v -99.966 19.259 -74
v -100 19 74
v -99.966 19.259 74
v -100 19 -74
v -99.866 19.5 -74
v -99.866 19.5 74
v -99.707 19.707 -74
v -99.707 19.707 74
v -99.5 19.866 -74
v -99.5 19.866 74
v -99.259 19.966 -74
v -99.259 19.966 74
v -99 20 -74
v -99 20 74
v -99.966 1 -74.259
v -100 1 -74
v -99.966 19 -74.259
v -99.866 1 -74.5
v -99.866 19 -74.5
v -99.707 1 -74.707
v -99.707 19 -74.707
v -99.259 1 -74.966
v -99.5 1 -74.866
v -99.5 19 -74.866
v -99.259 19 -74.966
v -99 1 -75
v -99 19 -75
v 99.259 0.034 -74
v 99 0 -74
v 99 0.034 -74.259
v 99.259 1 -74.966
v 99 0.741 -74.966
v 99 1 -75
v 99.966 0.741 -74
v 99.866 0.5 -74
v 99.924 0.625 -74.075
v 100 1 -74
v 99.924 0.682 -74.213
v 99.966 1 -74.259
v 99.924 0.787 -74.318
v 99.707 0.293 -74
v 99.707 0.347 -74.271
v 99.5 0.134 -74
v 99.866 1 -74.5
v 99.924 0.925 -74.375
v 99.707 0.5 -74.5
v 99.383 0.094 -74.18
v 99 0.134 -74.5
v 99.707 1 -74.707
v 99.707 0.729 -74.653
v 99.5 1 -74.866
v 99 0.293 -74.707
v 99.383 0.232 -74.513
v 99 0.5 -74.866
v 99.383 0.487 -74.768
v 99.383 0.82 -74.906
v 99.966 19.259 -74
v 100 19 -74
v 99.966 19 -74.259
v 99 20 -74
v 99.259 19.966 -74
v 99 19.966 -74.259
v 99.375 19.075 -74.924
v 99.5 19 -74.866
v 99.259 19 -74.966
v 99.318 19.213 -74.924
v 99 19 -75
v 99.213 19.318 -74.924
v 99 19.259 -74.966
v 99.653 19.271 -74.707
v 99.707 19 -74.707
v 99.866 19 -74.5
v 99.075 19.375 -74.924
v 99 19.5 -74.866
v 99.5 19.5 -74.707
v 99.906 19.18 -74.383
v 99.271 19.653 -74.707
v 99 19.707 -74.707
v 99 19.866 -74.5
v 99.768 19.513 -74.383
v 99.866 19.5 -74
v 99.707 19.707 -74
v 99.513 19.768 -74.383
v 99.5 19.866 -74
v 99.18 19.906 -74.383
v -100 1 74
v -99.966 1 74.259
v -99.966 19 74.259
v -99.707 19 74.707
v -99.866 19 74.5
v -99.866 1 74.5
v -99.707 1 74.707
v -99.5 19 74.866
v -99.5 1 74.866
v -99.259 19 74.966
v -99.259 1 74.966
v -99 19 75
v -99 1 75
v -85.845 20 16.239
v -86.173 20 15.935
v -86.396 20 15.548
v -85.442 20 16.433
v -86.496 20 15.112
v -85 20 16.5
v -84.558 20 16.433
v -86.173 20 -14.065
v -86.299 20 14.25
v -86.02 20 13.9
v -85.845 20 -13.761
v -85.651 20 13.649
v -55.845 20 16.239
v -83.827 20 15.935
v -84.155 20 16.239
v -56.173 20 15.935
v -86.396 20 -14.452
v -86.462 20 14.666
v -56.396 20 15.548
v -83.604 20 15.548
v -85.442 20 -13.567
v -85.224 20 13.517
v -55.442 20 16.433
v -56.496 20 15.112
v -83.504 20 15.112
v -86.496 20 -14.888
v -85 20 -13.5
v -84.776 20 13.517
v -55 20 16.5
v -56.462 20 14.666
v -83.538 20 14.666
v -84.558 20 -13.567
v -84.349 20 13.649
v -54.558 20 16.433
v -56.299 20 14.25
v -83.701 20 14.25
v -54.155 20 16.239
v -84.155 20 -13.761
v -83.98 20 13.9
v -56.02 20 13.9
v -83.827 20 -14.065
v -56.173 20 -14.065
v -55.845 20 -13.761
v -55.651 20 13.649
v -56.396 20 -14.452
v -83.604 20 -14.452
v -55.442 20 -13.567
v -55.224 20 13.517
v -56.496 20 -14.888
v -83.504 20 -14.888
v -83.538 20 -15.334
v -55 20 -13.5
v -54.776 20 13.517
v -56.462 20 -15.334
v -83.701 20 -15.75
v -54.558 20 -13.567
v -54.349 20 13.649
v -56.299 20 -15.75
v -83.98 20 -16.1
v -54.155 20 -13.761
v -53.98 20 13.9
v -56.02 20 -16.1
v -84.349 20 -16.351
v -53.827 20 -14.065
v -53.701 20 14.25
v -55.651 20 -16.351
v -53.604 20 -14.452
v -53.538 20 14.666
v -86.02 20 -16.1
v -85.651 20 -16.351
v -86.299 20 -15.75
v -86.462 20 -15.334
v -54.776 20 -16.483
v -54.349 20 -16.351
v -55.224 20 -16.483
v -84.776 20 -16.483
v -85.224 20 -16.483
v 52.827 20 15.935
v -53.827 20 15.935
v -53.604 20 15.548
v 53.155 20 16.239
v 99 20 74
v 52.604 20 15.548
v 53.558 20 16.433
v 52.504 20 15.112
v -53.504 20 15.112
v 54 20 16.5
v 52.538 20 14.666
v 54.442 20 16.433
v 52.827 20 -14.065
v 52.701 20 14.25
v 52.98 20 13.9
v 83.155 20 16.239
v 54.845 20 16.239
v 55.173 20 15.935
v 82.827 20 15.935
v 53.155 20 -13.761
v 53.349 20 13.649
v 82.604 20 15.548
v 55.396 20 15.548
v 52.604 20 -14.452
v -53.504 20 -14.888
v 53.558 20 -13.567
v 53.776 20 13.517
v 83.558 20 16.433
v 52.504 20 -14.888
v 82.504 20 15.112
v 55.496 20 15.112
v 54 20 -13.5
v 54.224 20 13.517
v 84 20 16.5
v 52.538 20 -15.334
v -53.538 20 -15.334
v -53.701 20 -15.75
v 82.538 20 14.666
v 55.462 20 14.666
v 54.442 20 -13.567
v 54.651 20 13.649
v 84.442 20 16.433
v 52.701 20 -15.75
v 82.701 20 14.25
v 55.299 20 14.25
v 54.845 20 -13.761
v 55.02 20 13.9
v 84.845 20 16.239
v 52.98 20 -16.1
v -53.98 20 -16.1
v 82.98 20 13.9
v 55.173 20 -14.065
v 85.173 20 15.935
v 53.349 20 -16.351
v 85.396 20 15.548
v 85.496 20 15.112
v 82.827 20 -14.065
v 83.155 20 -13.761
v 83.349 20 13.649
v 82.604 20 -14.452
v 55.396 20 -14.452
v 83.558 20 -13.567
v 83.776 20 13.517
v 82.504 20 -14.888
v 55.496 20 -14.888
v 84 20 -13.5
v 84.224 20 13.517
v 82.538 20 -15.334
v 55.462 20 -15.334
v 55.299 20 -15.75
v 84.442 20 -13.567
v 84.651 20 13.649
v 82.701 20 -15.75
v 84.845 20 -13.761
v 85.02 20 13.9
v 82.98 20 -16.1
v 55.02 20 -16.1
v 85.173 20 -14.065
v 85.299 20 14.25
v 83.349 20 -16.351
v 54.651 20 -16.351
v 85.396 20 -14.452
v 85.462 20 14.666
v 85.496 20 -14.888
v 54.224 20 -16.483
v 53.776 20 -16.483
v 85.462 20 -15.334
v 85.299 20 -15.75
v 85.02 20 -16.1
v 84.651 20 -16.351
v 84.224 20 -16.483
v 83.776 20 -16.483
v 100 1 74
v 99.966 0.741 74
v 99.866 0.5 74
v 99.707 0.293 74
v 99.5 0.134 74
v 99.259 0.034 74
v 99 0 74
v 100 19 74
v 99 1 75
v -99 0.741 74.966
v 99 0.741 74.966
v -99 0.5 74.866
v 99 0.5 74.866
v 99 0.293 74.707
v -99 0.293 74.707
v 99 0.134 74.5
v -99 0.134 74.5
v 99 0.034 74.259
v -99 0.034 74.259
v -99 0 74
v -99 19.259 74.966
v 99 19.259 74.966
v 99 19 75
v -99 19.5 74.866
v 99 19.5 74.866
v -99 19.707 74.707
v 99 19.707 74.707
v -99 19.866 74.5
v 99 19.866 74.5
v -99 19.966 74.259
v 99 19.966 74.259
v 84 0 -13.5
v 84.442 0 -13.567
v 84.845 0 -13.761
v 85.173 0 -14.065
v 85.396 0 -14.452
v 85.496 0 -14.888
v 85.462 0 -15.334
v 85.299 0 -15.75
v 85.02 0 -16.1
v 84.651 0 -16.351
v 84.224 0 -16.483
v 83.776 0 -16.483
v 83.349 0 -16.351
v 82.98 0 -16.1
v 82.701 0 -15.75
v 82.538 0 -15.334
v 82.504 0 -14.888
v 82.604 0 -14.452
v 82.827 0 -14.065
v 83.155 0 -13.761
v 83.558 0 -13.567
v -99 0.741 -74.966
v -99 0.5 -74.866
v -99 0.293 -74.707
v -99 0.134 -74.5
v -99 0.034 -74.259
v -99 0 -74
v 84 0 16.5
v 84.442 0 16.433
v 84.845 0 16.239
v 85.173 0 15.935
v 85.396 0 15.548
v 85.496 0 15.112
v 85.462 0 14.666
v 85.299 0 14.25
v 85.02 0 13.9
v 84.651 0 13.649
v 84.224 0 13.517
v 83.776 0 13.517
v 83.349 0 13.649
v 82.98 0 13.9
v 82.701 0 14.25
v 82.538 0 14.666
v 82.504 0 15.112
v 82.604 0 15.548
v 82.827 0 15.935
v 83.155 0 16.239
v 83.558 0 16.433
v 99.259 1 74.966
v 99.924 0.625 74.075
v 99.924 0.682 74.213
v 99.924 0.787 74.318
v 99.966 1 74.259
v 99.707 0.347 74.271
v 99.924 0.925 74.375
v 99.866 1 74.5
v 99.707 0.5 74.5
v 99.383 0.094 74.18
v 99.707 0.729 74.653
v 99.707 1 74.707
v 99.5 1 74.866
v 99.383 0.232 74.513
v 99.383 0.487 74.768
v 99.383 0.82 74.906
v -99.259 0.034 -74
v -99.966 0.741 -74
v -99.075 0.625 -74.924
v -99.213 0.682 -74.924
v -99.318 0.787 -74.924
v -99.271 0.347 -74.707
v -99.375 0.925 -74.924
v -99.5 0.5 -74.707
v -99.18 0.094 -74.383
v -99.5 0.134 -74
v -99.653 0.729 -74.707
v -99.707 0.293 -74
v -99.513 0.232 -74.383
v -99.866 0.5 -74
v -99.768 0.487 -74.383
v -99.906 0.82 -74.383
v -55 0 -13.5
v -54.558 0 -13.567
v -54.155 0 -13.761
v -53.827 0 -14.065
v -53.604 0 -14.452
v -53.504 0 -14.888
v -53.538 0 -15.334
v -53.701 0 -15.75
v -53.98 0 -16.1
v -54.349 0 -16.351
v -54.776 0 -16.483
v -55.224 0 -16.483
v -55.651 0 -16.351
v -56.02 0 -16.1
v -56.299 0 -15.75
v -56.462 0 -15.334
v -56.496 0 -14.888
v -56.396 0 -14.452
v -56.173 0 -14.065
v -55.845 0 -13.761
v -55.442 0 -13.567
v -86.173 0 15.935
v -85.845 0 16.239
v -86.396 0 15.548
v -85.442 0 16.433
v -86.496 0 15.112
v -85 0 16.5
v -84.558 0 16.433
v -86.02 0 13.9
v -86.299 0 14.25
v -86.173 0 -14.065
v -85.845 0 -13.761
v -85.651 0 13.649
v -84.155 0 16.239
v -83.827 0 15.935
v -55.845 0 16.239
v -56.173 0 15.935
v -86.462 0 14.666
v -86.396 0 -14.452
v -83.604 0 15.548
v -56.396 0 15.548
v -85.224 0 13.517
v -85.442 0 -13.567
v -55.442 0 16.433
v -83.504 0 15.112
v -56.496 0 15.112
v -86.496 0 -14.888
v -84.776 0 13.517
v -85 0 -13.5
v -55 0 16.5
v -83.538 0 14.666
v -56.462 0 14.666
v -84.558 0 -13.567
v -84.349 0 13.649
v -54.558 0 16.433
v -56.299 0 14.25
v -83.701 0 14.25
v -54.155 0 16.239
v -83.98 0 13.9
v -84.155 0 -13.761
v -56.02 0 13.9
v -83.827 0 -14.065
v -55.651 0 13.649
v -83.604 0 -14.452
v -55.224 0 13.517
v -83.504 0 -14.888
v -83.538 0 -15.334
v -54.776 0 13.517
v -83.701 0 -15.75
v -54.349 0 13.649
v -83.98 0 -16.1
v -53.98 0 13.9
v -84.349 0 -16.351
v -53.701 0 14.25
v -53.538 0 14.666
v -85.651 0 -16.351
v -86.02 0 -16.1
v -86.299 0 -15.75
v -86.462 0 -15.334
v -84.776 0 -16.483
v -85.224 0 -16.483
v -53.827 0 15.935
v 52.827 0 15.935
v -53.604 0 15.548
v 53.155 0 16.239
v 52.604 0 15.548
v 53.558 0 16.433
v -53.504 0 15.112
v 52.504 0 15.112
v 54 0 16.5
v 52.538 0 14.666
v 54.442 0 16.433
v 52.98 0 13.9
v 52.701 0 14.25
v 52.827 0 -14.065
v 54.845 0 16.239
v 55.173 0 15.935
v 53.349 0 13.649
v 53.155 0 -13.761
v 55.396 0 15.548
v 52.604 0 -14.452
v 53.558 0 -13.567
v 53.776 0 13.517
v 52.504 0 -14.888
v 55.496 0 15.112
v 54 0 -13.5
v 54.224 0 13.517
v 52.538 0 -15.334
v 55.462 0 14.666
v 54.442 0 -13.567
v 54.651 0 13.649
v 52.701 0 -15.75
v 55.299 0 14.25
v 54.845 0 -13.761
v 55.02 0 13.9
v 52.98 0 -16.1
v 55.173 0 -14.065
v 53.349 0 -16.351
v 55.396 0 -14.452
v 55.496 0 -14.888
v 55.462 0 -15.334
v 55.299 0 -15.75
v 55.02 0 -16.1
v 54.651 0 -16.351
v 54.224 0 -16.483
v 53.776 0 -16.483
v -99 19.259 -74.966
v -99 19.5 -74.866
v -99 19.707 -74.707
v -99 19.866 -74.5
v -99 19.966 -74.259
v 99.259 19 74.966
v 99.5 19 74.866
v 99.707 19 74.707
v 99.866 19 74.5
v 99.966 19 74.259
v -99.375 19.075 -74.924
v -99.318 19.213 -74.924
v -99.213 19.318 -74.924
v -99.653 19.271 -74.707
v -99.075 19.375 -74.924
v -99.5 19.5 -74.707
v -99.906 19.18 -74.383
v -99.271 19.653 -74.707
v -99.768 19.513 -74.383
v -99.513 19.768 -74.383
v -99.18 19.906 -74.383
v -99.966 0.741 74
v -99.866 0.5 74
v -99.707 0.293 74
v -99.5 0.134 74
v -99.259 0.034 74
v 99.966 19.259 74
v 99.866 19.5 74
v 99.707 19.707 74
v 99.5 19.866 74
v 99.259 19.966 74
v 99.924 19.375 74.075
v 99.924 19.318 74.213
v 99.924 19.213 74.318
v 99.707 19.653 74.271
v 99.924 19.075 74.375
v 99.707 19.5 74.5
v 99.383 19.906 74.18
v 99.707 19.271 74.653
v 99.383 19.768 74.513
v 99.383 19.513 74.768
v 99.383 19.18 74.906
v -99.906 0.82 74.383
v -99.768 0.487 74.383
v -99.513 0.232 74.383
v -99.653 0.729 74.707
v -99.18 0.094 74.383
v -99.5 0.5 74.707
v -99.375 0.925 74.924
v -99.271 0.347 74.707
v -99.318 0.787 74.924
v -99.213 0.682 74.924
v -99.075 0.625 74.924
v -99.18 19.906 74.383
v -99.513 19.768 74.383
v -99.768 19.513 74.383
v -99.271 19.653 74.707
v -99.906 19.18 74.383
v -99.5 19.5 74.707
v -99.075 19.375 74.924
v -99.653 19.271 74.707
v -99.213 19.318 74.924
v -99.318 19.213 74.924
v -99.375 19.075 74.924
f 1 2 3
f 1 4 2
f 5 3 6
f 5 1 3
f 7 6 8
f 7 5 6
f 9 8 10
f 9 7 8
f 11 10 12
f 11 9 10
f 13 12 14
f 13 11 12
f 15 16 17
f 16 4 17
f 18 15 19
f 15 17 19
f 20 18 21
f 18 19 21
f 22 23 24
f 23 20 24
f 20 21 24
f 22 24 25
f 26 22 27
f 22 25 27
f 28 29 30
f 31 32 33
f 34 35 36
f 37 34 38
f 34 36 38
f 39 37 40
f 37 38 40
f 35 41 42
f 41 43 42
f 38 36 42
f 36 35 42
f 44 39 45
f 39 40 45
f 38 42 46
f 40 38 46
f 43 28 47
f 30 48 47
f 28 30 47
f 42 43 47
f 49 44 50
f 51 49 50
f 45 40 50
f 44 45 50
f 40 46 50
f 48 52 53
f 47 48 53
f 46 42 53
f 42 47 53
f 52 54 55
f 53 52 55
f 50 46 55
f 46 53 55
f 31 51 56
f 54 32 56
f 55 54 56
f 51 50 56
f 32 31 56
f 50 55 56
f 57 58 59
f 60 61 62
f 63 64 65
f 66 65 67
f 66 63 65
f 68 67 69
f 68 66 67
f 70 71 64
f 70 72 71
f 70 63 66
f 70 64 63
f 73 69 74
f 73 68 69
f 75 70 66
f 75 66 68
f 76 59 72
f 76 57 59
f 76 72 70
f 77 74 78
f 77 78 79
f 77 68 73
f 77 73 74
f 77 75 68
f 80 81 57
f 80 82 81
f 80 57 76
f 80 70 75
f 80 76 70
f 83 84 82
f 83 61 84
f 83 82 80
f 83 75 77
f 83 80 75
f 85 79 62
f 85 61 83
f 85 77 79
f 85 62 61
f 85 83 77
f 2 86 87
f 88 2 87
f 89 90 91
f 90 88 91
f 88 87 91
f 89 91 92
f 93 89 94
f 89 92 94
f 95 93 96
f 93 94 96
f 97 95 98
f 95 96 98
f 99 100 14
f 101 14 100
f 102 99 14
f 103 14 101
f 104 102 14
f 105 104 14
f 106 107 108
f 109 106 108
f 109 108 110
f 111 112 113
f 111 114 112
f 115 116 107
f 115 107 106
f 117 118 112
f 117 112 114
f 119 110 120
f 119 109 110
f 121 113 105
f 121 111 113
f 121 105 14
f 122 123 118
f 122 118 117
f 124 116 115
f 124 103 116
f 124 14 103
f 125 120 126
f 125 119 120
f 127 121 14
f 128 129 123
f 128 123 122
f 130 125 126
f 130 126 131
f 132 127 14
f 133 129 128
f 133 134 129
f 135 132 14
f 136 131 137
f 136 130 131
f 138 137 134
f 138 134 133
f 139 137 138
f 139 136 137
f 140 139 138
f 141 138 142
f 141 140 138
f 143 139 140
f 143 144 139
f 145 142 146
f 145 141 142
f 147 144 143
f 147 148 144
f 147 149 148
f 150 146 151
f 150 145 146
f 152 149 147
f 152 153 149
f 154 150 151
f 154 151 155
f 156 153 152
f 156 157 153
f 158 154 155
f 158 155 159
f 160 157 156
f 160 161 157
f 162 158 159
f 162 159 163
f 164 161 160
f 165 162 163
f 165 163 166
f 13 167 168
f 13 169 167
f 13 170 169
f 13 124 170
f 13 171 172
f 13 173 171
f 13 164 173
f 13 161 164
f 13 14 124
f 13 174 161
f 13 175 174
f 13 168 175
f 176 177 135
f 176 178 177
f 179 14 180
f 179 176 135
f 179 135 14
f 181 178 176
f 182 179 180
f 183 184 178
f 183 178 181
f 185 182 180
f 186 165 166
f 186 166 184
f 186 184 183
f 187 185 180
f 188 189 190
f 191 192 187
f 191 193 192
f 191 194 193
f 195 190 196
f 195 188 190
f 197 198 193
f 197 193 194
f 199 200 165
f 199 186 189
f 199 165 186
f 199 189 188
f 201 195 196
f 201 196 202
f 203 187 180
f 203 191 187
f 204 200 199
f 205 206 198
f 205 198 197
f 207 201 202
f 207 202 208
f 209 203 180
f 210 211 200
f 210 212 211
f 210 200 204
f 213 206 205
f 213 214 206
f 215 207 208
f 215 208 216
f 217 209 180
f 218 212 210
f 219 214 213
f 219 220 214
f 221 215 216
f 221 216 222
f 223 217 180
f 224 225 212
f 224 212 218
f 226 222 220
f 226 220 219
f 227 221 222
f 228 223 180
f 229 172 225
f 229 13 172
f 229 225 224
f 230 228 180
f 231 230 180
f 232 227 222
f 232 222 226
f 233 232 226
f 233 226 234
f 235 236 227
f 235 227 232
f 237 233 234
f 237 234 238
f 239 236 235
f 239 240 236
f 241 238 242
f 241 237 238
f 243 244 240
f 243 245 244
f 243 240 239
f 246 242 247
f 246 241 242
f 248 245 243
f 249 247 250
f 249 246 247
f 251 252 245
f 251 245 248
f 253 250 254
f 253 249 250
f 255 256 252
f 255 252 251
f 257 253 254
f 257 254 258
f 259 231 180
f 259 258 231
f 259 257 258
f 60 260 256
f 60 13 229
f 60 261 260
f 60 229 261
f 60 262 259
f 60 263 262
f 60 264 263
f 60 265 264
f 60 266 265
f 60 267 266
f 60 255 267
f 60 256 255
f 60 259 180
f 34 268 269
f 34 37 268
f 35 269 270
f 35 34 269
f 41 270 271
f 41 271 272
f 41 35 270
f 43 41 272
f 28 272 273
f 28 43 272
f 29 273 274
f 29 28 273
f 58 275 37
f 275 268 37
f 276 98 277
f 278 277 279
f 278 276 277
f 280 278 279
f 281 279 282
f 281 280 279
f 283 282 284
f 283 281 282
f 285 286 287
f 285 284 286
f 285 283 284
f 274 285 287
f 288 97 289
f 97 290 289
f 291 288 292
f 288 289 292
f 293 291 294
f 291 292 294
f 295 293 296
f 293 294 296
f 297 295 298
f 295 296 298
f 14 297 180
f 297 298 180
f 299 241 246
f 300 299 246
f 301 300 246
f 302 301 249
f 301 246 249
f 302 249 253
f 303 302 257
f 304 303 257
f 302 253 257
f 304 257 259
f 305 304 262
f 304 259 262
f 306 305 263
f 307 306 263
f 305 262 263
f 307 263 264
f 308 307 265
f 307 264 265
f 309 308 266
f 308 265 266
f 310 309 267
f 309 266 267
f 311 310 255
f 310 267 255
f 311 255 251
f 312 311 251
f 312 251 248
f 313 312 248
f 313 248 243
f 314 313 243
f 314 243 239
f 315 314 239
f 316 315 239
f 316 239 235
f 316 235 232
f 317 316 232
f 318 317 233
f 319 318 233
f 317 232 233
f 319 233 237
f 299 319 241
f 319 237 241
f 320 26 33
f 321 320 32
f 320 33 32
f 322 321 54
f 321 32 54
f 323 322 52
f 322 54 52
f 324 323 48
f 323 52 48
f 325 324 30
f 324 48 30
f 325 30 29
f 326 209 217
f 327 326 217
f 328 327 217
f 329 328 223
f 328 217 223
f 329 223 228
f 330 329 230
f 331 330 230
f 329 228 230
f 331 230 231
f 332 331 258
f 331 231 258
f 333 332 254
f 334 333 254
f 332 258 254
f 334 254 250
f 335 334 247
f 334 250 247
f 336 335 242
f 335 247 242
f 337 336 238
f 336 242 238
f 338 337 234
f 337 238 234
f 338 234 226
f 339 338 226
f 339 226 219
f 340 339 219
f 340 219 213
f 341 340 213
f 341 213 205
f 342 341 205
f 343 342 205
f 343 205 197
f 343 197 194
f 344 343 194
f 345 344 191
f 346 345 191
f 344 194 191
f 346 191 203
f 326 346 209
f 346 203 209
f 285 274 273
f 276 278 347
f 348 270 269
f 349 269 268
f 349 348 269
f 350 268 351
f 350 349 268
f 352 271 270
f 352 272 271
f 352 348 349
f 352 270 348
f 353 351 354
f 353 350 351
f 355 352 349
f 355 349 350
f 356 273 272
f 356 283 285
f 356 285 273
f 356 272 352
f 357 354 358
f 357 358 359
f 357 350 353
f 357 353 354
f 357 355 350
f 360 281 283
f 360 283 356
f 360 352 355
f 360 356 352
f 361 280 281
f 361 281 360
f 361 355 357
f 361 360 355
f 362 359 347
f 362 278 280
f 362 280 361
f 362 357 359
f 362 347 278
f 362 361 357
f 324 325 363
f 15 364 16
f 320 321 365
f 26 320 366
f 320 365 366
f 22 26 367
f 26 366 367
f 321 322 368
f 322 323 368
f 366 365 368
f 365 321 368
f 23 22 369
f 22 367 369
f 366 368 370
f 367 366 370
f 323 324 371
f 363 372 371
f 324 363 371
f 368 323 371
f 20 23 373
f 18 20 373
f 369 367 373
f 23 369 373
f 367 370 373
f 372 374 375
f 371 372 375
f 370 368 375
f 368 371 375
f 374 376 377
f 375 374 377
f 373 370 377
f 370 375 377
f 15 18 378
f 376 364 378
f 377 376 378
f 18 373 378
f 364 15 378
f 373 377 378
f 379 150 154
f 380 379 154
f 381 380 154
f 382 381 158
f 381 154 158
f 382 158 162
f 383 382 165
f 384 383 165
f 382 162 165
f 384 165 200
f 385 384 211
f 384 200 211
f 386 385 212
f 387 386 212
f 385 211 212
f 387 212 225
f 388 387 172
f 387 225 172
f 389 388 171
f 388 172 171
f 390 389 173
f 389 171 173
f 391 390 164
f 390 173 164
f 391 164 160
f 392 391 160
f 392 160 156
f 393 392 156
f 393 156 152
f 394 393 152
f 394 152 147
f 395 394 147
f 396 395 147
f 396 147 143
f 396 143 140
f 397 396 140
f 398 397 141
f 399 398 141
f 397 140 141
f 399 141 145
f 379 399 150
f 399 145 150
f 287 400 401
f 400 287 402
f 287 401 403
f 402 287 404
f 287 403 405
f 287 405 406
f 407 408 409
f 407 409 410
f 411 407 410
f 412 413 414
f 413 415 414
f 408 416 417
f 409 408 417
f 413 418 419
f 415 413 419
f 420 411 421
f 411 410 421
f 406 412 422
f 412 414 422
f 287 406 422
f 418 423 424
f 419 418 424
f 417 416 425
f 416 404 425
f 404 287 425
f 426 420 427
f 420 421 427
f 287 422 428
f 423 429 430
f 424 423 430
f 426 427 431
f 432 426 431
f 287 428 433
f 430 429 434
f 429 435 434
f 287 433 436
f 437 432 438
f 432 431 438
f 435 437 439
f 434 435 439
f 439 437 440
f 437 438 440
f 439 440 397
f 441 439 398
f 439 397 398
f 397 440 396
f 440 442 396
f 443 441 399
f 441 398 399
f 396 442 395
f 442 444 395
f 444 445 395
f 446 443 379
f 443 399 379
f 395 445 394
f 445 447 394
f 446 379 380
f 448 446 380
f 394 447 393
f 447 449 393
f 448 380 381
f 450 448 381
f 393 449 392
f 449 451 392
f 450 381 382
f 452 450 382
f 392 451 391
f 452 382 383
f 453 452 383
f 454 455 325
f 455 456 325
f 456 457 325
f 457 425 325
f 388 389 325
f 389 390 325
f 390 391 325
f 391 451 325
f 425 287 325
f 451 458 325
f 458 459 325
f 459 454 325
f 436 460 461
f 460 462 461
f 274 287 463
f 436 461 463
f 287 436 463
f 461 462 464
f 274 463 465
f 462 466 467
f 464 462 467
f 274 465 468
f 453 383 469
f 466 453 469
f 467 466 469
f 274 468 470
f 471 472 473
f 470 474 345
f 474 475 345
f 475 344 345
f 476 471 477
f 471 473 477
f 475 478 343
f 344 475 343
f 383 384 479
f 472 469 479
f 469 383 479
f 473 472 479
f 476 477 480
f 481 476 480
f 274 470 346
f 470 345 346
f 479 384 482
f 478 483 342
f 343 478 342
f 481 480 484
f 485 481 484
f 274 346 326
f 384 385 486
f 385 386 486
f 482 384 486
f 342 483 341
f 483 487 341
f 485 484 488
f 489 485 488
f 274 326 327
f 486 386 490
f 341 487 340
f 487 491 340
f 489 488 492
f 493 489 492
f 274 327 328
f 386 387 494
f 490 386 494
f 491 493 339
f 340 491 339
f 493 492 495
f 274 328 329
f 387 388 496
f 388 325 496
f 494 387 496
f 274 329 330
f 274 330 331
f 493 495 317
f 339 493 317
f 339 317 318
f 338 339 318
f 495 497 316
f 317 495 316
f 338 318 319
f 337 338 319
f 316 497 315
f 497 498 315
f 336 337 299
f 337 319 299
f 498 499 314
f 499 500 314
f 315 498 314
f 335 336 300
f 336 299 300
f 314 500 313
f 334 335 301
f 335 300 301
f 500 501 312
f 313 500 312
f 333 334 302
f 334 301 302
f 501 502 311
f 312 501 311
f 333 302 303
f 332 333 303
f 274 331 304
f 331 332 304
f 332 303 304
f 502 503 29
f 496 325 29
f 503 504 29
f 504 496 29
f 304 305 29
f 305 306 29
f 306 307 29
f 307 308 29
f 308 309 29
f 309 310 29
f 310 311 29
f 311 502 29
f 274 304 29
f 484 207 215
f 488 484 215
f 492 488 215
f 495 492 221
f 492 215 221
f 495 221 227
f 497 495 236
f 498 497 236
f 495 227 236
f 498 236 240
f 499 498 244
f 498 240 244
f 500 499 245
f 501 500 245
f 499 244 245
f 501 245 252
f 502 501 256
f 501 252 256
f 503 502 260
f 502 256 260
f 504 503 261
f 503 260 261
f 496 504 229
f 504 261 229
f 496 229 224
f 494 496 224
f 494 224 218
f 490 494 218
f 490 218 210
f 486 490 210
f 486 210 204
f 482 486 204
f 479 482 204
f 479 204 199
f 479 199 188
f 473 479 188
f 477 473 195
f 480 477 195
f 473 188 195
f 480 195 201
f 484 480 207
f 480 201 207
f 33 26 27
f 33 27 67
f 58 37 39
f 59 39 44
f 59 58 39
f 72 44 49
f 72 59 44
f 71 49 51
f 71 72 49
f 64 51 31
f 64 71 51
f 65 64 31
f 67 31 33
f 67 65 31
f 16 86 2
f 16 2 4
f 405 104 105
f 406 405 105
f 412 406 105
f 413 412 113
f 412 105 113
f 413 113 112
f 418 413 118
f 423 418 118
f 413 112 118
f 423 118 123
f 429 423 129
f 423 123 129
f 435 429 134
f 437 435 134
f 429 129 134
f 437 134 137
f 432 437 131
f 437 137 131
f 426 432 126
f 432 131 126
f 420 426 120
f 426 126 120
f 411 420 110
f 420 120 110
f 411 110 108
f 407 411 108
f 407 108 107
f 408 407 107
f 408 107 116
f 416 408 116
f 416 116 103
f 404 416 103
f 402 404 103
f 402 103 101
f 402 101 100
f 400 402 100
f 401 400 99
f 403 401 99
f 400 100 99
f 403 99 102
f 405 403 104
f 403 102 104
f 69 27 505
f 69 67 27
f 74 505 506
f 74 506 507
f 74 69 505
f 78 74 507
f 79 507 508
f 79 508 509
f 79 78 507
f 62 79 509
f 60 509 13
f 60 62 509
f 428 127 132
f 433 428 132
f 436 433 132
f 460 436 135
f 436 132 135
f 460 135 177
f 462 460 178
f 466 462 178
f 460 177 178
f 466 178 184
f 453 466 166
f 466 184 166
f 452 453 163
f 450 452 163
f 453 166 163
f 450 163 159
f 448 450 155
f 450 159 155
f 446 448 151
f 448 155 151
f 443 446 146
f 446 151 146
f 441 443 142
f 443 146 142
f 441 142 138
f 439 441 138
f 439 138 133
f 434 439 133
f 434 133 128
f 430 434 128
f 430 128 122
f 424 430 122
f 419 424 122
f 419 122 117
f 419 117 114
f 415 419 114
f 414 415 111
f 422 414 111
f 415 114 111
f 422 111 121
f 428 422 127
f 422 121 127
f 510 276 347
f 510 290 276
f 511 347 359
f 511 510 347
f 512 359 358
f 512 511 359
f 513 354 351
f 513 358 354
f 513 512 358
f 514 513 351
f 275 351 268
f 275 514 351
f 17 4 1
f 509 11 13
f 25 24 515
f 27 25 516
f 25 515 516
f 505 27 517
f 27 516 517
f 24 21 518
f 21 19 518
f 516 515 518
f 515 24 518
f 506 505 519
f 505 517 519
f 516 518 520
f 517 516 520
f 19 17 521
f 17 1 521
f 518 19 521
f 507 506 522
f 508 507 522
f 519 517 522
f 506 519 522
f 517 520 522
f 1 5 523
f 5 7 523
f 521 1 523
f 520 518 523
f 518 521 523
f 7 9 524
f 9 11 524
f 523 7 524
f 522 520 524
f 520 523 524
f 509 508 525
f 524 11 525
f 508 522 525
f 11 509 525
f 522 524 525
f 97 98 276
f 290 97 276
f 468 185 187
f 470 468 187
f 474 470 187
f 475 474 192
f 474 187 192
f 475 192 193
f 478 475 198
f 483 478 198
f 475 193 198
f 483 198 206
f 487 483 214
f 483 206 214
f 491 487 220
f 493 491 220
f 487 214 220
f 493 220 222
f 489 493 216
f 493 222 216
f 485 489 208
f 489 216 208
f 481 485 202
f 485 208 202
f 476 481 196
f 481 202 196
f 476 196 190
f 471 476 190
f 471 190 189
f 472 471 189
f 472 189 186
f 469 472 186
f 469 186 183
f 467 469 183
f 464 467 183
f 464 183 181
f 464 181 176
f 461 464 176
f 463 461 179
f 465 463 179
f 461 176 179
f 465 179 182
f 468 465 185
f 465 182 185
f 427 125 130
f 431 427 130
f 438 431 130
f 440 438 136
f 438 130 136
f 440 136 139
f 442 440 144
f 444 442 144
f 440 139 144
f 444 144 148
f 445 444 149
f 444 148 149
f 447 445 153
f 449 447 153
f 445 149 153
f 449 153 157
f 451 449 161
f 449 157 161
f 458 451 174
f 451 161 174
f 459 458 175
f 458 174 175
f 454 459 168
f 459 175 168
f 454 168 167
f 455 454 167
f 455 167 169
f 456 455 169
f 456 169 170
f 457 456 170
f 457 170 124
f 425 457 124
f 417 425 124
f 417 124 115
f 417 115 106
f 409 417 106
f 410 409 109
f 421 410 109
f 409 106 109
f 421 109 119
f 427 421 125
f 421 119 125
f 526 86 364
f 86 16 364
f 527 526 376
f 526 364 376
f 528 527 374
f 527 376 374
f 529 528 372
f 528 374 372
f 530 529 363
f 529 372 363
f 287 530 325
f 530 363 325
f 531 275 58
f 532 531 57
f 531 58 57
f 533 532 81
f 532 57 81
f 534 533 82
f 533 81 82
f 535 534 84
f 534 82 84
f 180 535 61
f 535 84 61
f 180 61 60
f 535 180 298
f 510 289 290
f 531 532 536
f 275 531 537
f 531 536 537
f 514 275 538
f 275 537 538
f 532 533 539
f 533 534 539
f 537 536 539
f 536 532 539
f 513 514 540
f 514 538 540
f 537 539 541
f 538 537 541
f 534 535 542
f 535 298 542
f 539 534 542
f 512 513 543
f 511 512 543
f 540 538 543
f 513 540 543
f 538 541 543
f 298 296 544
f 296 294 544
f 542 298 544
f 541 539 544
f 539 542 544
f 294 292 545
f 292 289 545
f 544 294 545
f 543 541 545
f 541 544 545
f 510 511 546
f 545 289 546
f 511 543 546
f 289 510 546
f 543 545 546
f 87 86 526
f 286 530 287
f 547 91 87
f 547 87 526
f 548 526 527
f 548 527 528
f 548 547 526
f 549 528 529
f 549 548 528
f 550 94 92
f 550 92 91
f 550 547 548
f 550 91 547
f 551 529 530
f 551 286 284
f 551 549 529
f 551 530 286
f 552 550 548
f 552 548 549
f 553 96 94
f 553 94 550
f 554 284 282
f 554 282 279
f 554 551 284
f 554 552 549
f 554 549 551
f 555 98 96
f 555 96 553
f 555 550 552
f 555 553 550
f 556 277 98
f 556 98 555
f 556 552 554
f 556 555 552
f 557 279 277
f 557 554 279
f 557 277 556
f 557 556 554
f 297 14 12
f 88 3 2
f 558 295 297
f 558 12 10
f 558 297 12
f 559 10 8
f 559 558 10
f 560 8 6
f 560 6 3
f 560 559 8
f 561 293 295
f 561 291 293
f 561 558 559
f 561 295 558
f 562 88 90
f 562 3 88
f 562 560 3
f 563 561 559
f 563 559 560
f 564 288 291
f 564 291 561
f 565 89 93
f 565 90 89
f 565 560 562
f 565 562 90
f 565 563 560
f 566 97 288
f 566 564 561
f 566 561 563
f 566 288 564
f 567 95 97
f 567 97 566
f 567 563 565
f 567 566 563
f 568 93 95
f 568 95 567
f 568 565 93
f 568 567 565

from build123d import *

# Parameters (mm, degrees)
SKETCH2_W           = 200
SKETCH2_H           = 150
BOSS_EXTRUDE1_DEPTH = 20
FILLET1_R           = 1
FILLET2_R           = 1
SKETCH3_R           = 1.5
CUT_EXTRUDE1_DEPTH  = 20
SKETCH4_R           = 1.5
CUT_EXTRUDE2_DEPTH  = 20


with BuildPart() as part:
    # Sketch2 → Boss-Extrude1 (new body)
    with BuildSketch(Plane(origin=(0, 0, 0), x_dir=(1, 0, 0), z_dir=(0, 1, 0))):
        Rectangle(SKETCH2_W, SKETCH2_H)
    extrude(amount=BOSS_EXTRUDE1_DEPTH)

    # Fillet1
    fillet1_edges = [part.edges().sort_by_distance(p)[0] for p in [
        (-100, 20, 0),
        (0, 20, 75),
        (100, 20, 0),
        (0, 0, 75),
        (-100, 0, 0),
        (0, 0, -75),
        (100, 0, 0),
        (100, 10, 75),
        (-100, 10, -75),
        (100, 10, -75),
        (0, 20, -75),
    ]]
    fillet(fillet1_edges, radius=FILLET1_R)

    # Fillet2
    # the kernel refuses this fillet: 1 mm, written as the material it takes off along each edge
    with BuildSketch(Plane(origin=(-99, 19, 74), x_dir=(-1, 0, 0), z_dir=(0, 0, 1))) as fillet2_piece_1_section:
        Polygon((0, 0), (FILLET2_R, 0), (FILLET2_R, -FILLET2_R), (0, -FILLET2_R), align=None)
    fillet2_piece_1 = extrude(amount=FILLET2_R, mode=Mode.PRIVATE)
    fillet2_piece_1 = fillet2_piece_1 - Plane(origin=(-99, 19, 74), x_dir=(0.7071067811865475, -0.7071067811865475, 0), z_dir=(0, 0, 1)) * Sphere(FILLET2_R, mode=Mode.PRIVATE)
    add(fillet2_piece_1, mode=Mode.SUBTRACT)
    with BuildSketch(Plane(origin=(-99, 1, 74), x_dir=(-1, 0, 0), z_dir=(0, 0, 1))) as fillet2_piece_2_section:
        Polygon((0, 0), (FILLET2_R, 0), (FILLET2_R, FILLET2_R), (0, FILLET2_R), align=None)
    fillet2_piece_2 = extrude(amount=FILLET2_R, mode=Mode.PRIVATE)
    fillet2_piece_2 = fillet2_piece_2 - Plane(origin=(-99, 1, 74), x_dir=(0.7071067811865475, 0.7071067811865475, 0), z_dir=(0, 0, 1)) * Sphere(FILLET2_R, mode=Mode.PRIVATE)
    add(fillet2_piece_2, mode=Mode.SUBTRACT)
    with BuildSketch(Plane(origin=(-100, 1, 75), x_dir=(1, 0, 0), z_dir=(0, 1, 0))) as fillet2_piece_3:
        with BuildLine():
            CenterArc((FILLET2_R, FILLET2_R), FILLET2_R, 180, 90)
            Line((0, FILLET2_R), (0, 0))
            Line((0, 0), (FILLET2_R, 0))
        make_face()
    extrude(amount=18, mode=Mode.SUBTRACT)

    # Sketch3 → Cut-Extrude1 (cut)
    with BuildSketch(Plane(origin=(0, 20, 0), x_dir=(1, 0, 0), z_dir=(0, 1, 0))):
        with Locations(Location((84, 15, 0), (0, 0, 270))):
            Circle(SKETCH3_R)
        with Locations(Location((54, 15, 0), (0, 0, 270))):
            Circle(SKETCH3_R)
        with Locations(Location((54, -15, 0), (0, 0, 270))):
            Circle(SKETCH3_R)
        with Locations(Location((84, -15, 0), (0, 0, 270))):
            Circle(SKETCH3_R)
    extrude(amount=-CUT_EXTRUDE1_DEPTH, mode=Mode.SUBTRACT)

    # Sketch4 → Cut-Extrude2 (cut)
    with BuildSketch(Plane(origin=(0, 20, 0), x_dir=(1, 0, 0), z_dir=(0, 1, 0))):
        with Locations(Location((-85, 15, 0), (0, 0, 270))):
            Circle(SKETCH4_R)
        with Locations(Location((-55, 15, 0), (0, 0, 270))):
            Circle(SKETCH4_R)
        with Locations(Location((-85, -15, 0), (0, 0, 270))):
            Circle(SKETCH4_R)
        with Locations(Location((-55, -15, 0), (0, 0, 270))):
            Circle(SKETCH4_R)
    extrude(amount=-CUT_EXTRUDE2_DEPTH, mode=Mode.SUBTRACT)


solid = part.part
